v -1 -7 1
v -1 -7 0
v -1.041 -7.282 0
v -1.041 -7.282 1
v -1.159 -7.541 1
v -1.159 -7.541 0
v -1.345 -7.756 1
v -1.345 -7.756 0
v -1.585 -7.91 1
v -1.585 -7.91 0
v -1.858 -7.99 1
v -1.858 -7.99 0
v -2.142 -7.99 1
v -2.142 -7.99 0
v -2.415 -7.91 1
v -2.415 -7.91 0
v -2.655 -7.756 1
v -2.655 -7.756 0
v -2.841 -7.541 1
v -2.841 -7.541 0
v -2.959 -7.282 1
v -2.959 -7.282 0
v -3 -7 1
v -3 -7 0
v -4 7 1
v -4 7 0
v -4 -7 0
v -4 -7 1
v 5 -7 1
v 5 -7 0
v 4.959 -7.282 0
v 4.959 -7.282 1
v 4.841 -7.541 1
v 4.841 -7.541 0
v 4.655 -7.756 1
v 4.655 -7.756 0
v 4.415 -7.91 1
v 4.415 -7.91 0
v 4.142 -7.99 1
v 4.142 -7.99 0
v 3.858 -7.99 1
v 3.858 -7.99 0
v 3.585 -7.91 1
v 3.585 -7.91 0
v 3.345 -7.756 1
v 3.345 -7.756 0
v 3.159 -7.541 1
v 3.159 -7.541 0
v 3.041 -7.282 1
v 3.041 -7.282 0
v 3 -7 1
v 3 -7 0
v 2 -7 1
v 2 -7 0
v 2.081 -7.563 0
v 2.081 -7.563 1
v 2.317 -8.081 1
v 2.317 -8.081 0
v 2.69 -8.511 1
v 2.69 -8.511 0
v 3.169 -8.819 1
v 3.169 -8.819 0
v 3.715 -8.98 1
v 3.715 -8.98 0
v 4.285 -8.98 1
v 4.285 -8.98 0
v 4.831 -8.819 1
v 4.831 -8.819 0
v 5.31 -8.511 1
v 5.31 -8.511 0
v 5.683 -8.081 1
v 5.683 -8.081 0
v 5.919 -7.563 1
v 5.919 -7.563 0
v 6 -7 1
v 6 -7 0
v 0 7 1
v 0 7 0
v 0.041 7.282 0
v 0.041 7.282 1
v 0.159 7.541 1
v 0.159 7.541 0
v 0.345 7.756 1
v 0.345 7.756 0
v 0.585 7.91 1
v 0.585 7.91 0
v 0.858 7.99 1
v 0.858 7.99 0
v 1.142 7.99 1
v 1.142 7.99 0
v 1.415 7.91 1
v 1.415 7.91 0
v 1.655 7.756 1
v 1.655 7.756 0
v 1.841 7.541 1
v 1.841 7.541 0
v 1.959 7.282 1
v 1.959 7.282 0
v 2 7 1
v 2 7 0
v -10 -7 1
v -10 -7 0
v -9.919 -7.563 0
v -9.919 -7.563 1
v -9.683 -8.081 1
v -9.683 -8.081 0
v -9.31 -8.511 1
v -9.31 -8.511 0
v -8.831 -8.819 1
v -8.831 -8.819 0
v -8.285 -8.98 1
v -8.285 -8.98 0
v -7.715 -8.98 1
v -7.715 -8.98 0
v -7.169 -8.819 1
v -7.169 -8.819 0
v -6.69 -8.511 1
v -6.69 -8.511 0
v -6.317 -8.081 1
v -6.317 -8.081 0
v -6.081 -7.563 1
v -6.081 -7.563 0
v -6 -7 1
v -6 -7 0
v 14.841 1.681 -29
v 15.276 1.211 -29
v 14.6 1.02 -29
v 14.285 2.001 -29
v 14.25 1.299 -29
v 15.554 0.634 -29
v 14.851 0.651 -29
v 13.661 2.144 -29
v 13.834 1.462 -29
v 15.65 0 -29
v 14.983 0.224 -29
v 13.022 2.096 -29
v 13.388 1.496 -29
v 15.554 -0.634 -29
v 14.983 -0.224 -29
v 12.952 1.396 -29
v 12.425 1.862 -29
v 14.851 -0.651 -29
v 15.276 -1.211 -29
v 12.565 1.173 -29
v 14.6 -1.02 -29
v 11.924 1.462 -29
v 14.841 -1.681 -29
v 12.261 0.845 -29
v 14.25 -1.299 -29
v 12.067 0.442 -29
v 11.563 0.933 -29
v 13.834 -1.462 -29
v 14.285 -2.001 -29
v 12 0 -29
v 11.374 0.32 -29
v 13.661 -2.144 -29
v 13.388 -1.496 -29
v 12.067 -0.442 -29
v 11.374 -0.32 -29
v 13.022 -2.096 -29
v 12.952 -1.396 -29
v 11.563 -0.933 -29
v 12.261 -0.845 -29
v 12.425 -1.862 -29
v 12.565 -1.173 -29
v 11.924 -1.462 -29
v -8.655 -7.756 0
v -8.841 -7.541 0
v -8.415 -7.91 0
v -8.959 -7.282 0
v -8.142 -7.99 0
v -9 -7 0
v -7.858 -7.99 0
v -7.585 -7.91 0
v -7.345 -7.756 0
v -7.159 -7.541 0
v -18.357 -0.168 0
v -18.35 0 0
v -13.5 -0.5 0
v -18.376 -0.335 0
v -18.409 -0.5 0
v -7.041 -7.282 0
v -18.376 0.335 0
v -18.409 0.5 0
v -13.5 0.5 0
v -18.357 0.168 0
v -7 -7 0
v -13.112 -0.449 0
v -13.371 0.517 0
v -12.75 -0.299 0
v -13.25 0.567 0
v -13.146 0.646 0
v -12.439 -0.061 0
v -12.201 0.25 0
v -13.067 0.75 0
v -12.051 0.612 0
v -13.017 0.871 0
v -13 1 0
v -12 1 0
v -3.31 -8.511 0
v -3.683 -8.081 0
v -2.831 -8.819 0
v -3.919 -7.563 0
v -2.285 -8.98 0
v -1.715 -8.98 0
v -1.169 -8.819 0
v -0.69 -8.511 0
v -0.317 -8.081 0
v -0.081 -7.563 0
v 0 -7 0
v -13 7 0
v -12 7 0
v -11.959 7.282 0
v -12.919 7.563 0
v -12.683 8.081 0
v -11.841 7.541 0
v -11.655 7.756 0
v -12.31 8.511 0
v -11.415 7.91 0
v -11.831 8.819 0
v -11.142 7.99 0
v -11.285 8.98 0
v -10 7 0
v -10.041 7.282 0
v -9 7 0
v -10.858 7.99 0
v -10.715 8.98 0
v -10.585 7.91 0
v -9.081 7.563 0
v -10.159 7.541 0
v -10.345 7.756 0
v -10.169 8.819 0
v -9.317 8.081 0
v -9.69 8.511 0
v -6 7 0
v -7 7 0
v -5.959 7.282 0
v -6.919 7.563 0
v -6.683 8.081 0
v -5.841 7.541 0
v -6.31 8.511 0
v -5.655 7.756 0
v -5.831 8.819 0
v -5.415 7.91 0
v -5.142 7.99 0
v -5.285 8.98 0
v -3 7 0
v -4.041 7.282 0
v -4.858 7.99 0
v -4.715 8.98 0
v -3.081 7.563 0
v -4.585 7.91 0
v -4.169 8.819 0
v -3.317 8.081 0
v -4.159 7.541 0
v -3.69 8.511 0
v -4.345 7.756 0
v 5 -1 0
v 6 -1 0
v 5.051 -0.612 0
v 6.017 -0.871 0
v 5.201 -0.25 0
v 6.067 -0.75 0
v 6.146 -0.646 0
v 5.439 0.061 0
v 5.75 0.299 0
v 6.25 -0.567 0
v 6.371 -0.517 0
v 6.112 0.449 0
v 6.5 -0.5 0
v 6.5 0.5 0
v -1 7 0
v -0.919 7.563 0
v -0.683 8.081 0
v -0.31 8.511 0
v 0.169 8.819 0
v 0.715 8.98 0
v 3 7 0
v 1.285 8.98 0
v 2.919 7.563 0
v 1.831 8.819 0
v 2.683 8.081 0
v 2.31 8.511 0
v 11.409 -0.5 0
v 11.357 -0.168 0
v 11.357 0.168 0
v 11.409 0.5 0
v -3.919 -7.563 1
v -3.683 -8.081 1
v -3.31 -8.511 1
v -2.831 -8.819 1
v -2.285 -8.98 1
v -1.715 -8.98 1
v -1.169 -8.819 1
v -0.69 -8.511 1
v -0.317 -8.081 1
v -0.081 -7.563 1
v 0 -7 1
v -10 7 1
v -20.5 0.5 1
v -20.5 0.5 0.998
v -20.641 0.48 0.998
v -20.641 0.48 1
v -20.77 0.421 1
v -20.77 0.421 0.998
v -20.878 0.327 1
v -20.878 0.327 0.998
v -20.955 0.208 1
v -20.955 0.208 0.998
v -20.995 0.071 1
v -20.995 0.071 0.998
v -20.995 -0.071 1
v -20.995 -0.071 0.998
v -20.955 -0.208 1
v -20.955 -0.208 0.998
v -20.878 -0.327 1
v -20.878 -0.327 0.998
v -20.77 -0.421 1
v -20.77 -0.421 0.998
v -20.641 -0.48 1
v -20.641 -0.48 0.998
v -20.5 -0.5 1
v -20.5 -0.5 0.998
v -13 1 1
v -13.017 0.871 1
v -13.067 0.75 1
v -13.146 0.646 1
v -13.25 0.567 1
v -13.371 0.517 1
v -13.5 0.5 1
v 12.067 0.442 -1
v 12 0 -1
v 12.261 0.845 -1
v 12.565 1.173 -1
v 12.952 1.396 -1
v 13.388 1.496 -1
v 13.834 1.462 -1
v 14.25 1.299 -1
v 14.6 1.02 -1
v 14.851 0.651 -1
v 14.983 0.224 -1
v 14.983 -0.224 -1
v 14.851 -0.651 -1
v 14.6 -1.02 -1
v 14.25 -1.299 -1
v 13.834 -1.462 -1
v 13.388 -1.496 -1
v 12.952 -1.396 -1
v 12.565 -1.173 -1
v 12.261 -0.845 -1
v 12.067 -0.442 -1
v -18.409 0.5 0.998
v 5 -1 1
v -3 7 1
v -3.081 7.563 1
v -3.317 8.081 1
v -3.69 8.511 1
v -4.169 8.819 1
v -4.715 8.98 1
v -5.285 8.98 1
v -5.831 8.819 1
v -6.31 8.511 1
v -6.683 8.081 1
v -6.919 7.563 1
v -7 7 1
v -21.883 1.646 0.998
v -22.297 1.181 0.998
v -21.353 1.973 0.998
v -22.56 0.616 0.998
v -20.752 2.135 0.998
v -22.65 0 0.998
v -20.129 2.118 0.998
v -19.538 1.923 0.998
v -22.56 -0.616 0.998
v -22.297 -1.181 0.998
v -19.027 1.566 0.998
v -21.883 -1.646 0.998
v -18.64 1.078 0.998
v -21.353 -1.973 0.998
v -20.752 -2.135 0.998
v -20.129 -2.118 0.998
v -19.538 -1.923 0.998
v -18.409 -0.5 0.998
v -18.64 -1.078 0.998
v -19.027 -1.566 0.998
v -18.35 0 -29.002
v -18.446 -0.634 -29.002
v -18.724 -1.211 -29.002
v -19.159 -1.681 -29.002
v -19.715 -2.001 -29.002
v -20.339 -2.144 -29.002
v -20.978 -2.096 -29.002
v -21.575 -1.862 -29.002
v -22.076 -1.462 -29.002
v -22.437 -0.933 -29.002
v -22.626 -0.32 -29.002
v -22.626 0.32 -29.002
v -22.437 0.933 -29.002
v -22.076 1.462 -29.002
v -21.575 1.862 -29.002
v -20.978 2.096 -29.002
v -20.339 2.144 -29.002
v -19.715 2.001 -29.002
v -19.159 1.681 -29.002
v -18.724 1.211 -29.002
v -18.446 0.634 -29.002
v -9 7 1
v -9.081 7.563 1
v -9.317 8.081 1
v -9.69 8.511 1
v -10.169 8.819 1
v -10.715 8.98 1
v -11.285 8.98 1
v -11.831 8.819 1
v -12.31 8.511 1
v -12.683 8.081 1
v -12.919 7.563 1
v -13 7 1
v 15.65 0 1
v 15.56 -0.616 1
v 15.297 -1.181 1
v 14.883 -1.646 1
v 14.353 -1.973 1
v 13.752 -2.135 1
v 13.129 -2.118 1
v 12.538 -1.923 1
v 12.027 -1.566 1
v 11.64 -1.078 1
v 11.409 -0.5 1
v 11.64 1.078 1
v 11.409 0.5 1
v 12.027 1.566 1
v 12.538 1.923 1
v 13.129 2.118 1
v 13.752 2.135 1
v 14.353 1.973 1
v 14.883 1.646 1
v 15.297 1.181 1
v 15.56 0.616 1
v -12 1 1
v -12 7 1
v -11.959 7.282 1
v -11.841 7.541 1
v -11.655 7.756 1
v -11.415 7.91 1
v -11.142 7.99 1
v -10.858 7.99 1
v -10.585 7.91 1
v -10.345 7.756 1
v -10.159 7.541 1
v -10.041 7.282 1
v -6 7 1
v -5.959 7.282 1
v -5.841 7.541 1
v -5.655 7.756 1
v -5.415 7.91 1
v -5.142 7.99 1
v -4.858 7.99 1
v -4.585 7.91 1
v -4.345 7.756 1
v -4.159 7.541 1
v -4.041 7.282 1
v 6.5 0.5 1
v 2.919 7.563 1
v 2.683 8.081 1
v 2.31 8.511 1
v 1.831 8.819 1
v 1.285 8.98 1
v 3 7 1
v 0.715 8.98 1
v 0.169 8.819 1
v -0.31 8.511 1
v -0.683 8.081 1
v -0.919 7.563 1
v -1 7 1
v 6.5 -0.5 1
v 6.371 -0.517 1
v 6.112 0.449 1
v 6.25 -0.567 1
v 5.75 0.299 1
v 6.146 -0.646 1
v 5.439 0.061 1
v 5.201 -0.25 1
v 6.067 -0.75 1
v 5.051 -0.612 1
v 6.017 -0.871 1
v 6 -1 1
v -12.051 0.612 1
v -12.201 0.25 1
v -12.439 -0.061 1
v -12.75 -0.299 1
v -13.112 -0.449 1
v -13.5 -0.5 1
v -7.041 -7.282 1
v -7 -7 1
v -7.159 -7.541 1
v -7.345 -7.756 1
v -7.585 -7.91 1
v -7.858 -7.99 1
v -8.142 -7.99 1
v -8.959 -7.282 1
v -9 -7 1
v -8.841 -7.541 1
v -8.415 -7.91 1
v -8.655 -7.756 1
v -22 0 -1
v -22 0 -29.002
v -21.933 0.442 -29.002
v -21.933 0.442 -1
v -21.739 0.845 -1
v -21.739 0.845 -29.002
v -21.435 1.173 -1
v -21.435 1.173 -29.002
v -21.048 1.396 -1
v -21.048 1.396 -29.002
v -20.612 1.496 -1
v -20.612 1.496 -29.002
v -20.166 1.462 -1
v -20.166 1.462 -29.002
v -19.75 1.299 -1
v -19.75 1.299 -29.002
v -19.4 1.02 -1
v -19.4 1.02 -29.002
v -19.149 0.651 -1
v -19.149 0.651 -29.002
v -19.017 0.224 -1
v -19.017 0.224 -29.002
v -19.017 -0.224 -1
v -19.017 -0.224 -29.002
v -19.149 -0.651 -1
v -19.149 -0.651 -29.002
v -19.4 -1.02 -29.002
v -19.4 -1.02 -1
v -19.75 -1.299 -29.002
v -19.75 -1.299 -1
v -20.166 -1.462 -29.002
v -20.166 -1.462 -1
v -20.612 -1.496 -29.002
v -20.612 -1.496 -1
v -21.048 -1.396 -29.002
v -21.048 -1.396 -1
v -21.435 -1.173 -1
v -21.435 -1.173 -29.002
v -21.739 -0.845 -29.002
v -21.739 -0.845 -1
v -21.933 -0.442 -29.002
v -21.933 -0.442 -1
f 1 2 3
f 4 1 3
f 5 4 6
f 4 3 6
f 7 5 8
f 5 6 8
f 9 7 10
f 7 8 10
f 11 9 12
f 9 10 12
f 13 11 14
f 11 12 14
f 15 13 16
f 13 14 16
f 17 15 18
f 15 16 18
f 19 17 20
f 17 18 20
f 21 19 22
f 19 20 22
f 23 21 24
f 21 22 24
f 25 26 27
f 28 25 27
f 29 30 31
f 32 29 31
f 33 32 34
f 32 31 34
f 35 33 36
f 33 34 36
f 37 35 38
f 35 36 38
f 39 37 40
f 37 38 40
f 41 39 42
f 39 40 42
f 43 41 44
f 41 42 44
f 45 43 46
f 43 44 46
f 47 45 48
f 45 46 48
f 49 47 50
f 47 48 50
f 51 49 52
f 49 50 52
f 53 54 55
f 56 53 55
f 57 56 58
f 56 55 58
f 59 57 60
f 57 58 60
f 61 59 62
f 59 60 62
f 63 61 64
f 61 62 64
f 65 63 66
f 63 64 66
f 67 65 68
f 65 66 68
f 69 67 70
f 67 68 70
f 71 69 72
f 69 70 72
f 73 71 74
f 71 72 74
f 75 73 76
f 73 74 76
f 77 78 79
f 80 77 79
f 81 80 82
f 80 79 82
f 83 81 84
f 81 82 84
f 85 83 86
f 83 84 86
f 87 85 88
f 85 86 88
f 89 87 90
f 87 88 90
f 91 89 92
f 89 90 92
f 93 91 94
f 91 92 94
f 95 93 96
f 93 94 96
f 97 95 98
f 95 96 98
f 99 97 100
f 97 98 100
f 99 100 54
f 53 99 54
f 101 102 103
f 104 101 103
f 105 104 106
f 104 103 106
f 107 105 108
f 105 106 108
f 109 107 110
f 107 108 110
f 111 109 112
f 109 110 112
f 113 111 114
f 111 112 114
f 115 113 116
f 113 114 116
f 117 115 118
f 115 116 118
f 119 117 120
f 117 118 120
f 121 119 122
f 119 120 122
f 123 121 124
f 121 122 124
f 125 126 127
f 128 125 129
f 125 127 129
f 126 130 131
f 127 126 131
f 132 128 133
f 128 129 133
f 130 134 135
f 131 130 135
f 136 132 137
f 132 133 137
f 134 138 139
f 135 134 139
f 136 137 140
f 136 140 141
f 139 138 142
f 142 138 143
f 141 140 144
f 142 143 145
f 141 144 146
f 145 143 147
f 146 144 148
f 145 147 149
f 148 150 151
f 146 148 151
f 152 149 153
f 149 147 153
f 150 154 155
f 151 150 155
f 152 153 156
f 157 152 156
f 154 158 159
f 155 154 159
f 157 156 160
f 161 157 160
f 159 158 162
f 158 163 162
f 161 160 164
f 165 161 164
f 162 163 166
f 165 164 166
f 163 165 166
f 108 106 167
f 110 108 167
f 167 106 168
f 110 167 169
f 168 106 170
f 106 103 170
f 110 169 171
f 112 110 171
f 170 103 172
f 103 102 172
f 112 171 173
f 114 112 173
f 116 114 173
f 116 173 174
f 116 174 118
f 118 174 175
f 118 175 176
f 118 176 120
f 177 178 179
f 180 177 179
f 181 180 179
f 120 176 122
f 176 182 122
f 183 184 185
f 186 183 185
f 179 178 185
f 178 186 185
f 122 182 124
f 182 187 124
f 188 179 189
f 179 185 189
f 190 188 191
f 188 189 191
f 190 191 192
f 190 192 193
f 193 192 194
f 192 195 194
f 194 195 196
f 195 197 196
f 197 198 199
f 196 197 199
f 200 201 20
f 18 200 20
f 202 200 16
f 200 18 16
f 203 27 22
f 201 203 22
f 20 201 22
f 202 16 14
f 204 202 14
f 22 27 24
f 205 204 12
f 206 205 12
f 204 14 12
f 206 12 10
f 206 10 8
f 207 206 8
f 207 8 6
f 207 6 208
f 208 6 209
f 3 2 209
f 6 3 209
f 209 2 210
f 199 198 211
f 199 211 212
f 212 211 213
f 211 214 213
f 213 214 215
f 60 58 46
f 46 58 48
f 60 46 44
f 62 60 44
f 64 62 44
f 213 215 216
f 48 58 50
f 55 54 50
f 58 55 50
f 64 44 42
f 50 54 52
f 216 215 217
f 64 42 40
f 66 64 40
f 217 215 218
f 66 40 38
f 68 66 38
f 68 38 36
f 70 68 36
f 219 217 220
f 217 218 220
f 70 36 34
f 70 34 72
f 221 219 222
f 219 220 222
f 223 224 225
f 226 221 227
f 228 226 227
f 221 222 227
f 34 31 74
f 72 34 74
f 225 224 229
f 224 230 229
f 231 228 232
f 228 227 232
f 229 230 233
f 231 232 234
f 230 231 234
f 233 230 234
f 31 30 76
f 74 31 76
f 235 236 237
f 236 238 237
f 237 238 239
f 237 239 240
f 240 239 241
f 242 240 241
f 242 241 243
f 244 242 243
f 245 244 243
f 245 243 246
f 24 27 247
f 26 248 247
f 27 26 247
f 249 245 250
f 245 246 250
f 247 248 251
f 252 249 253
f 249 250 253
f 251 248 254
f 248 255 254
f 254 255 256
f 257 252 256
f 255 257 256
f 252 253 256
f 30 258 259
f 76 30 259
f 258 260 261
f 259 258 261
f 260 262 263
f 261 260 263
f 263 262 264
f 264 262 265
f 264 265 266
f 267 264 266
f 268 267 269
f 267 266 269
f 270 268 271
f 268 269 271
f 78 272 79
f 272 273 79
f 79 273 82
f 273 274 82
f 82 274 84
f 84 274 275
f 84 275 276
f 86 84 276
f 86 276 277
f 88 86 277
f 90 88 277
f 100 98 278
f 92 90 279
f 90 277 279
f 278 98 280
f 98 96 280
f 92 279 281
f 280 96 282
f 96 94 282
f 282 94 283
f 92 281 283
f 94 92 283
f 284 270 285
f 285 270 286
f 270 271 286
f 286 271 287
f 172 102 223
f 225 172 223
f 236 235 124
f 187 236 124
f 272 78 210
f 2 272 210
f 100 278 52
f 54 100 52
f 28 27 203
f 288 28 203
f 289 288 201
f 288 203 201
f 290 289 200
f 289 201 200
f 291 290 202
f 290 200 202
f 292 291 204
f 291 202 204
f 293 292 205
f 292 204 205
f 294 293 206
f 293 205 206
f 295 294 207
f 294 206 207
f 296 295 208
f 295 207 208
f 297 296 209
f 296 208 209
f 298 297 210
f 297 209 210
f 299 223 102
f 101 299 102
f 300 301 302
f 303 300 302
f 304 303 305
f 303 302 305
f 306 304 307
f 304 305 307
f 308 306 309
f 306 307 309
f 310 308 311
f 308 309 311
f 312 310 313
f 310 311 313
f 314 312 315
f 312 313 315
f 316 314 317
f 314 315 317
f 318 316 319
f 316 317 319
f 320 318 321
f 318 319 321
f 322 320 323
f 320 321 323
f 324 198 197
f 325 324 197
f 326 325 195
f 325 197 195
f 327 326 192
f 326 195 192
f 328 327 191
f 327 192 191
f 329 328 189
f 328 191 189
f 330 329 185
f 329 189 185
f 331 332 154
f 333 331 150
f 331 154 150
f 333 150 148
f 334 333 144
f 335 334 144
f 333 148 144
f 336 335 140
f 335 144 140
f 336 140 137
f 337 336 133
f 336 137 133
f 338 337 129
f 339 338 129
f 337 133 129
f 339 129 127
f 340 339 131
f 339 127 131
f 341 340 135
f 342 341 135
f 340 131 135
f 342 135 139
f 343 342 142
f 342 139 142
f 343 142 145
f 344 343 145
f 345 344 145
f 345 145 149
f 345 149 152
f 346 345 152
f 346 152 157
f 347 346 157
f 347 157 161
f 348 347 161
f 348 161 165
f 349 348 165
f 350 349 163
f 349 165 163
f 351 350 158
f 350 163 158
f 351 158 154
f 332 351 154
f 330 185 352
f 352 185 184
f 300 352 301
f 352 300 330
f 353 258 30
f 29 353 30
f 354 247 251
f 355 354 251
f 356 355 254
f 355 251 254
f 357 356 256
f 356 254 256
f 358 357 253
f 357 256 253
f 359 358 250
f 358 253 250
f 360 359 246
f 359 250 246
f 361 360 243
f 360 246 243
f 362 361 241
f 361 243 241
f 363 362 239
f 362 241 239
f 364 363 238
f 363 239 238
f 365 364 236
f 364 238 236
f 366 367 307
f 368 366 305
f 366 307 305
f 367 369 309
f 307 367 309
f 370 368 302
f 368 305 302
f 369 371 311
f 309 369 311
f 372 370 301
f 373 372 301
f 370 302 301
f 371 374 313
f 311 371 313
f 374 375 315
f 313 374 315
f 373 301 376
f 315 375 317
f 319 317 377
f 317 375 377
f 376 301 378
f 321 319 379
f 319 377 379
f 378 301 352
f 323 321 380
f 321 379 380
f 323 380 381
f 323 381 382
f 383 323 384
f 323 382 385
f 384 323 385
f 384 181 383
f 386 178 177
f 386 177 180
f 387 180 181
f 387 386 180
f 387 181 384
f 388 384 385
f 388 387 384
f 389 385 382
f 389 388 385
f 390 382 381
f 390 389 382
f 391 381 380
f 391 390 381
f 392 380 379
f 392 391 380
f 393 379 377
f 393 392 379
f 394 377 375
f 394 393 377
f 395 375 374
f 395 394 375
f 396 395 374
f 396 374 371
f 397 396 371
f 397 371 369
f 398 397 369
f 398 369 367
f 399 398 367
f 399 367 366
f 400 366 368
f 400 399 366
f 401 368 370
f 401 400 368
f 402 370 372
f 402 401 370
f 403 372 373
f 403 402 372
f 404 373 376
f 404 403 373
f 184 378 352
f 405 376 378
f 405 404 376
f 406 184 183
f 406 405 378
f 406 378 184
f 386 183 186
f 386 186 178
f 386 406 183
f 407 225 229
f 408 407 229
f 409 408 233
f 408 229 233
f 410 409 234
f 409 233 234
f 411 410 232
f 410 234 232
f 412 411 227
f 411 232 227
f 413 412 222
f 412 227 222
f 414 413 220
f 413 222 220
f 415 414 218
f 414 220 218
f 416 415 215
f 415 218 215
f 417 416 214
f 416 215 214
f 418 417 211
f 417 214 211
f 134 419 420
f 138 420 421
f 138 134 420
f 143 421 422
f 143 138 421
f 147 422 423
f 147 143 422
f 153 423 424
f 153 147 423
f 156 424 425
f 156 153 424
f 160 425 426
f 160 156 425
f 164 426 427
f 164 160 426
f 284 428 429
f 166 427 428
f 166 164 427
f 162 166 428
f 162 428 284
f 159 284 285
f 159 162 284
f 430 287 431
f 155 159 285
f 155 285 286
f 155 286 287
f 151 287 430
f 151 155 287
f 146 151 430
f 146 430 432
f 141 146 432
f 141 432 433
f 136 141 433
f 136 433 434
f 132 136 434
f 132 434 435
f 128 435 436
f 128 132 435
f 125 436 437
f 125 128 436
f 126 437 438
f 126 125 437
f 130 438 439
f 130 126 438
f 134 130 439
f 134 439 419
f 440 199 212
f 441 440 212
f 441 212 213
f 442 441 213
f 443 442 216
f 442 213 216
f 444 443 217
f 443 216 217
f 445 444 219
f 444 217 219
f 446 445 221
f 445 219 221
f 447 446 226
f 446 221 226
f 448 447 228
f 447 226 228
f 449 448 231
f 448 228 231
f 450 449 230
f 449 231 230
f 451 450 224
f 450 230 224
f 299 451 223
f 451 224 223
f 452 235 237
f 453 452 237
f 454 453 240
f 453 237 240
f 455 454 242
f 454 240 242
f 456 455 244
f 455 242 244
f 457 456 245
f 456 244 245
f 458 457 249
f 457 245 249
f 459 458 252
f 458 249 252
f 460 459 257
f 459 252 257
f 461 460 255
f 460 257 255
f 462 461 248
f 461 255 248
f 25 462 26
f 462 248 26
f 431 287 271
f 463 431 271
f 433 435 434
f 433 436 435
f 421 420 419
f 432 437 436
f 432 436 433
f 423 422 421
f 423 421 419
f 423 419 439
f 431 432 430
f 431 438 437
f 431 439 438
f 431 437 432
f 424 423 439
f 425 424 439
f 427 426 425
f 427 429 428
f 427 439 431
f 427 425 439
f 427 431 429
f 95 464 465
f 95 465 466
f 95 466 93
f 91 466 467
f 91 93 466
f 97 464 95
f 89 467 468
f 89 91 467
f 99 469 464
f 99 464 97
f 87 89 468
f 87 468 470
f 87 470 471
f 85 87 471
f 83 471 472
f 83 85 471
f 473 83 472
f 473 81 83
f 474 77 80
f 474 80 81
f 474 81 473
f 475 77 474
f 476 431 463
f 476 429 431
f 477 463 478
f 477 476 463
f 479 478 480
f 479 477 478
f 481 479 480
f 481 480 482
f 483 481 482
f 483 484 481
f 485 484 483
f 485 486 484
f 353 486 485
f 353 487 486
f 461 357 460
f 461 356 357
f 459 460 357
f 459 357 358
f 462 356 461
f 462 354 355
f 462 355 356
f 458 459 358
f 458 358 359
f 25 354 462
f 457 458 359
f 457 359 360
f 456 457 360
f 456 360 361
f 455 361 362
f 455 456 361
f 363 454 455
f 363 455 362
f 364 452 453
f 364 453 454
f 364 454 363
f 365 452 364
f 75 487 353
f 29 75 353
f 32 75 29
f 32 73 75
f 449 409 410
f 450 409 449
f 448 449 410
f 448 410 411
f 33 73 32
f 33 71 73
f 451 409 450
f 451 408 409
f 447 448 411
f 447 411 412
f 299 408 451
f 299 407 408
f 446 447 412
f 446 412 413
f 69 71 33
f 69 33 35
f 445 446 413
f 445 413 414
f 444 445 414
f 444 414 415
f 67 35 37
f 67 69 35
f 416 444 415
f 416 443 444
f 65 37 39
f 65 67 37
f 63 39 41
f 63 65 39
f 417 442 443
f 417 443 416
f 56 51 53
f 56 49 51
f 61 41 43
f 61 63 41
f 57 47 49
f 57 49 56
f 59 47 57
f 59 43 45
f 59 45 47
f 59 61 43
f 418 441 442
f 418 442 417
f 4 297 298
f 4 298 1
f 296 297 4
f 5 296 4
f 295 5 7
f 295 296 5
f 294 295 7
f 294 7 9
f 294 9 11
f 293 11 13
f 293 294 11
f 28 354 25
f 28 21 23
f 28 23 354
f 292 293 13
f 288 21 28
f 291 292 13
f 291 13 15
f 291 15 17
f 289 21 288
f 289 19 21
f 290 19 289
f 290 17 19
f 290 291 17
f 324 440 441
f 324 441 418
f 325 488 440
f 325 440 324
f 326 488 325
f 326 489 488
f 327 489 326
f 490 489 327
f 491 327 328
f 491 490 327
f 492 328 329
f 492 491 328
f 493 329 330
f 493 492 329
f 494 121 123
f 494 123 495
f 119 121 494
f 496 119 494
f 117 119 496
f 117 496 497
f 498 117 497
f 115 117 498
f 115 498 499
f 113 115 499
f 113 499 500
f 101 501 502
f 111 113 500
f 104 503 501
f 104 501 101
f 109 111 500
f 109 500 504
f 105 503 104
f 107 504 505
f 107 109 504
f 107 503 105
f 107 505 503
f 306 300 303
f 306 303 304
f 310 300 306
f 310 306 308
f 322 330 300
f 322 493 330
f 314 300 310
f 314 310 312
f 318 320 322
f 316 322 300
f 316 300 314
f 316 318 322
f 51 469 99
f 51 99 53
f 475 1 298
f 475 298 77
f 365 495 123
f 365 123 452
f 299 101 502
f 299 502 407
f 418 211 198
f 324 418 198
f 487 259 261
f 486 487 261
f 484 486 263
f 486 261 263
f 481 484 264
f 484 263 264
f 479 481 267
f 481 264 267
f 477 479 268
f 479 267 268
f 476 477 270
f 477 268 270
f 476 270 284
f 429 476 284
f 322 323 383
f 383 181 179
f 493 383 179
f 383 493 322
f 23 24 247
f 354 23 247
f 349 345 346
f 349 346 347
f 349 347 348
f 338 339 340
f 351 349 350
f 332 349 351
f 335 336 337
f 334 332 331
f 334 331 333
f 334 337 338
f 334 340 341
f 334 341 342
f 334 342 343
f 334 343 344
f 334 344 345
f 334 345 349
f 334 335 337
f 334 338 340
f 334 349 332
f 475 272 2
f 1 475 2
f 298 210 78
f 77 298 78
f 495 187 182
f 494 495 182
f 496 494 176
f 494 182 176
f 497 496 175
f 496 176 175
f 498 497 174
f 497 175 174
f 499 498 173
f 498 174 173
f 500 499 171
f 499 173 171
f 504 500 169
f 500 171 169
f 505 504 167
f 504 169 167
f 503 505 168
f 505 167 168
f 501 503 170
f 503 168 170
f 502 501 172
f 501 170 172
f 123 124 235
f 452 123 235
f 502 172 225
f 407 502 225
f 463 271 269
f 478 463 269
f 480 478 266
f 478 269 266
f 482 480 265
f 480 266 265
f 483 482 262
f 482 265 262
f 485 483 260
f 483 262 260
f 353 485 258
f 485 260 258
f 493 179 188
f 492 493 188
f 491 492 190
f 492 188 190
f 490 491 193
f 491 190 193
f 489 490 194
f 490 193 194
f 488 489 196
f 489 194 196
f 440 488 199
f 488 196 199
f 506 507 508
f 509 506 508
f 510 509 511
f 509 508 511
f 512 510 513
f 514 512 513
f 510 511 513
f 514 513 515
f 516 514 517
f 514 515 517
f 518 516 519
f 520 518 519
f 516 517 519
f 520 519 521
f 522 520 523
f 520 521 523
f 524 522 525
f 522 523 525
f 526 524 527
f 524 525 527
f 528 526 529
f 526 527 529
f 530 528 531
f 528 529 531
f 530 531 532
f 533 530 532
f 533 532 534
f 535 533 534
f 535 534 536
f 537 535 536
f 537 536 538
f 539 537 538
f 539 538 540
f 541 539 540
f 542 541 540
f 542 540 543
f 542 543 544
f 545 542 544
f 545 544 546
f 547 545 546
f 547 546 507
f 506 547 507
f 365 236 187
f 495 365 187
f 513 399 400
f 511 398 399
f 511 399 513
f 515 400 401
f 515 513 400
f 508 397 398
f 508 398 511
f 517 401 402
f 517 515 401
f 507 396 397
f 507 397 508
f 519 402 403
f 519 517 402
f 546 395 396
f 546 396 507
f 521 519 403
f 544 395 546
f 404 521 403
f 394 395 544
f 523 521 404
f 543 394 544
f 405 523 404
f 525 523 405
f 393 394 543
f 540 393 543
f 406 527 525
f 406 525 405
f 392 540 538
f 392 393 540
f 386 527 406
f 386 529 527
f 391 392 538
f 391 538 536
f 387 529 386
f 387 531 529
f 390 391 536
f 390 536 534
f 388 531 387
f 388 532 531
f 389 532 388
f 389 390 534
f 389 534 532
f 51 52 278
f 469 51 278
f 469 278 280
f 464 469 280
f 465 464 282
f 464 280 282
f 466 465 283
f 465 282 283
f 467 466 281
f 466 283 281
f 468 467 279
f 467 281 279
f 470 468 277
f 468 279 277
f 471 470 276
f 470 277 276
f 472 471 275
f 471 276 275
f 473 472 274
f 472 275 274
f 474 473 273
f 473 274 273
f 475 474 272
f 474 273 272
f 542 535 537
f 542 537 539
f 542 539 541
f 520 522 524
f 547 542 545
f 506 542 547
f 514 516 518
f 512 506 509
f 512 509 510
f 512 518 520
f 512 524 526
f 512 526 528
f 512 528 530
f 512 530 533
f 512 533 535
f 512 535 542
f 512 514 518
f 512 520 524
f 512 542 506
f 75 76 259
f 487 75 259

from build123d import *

# Parameters (mm, degrees)
BOSS_EXTRUDE1_DEPTH = 1
SKETCH3_W           = 2.15
SKETCH3_H           = 30
SKETCH4_W           = 2.15
SKETCH4_H           = 30
SKETCH5_R           = 1.5
CUT_EXTRUDE1_DEPTH  = 28
SKETCH6_R           = 1.5
CUT_EXTRUDE2_DEPTH  = 28


with BuildPart() as part:
    # Sketch2 → Boss-Extrude1 (new body)
    with BuildSketch(Plane.XY):
        with BuildLine():
            Line((-20.5, -0.5), (-13.5, -0.5))
            ThreePointArc((-13.5, -0.5), (-12.439339828, -0.060660172), (-12, 1))
            Line((-12, 1), (-12, 7))
            ThreePointArc((-12, 7), (-11, 8), (-10, 7))
            Line((-10, 7), (-10, 0))
            Line((-10, 0), (-10, -7))
            ThreePointArc((-10, -7), (-8, -9), (-6, -7))
            Line((-6, -7), (-6, 0))
            Line((-6, 0), (-6, 7))
            ThreePointArc((-6, 7), (-5, 8), (-4, 7))
            Line((-4, 7), (-4, 0))
            Line((-4, 0), (-4, -7))
            ThreePointArc((-4, -7), (-2, -9), (0, -7))
            Line((0, -7), (0, 0))
            Line((0, 0), (0, 7))
            ThreePointArc((0, 7), (1, 8), (2, 7))
            Line((2, 7), (2, 0))
            Line((2, 0), (2, -7))
            ThreePointArc((2, -7), (4, -9), (6, -7))
            Line((6, -7), (6, -1))
            ThreePointArc((6, -1), (6.146446609, -0.646446609), (6.5, -0.5))
            Line((6.5, -0.5), (13.5, -0.5))
            ThreePointArc((13.5, -0.5), (14, 0), (13.5, 0.5))
            Line((13.5, 0.5), (6.5, 0.5))
            ThreePointArc((6.5, 0.5), (5.439339828, 0.060660172), (5, -1))
            Line((5, -1), (5, -7))
            ThreePointArc((5, -7), (4, -8), (3, -7))
            Line((3, -7), (3, 0))
            Line((3, 0), (3, 7))
            ThreePointArc((3, 7), (1, 9), (-1, 7))
            Line((-1, 7), (-1, 0))
            Line((-1, 0), (-1, -7))
            ThreePointArc((-1, -7), (-2, -8), (-3, -7))
            Line((-3, -7), (-3, 0))
            Line((-3, 0), (-3, 7))
            ThreePointArc((-3, 7), (-5, 9), (-7, 7))
            Line((-7, 7), (-7, 0))
            Line((-7, 0), (-7, -7))
            ThreePointArc((-7, -7), (-8, -8), (-9, -7))
            Line((-9, -7), (-9, 0))
            Line((-9, 0), (-9, 7))
            ThreePointArc((-9, 7), (-11, 9), (-13, 7))
            Line((-13, 7), (-13, 1))
            ThreePointArc((-13, 1), (-13.146446609, 0.646446609), (-13.5, 0.5))
            Line((-13.5, 0.5), (-20.5, 0.5))
            ThreePointArc((-20.5, 0.5), (-21, 0), (-20.5, -0.5))
        make_face()
    extrude(amount=BOSS_EXTRUDE1_DEPTH)

    # Sketch3 → Revolve1 (revolve)
    with BuildSketch(Plane(origin=(0, 0, 0), x_dir=(1, 0, 0), z_dir=(0, 1, 0)), mode=Mode.PRIVATE) as revolve1_sk:
        with Locations((-21.575, 14.001632273)):
            Rectangle(SKETCH3_W, SKETCH3_H)
    revolve(revolve1_sk.sketch.rotate(Axis((-20.5, 0, 0.998367727), (0, 0, -1)), 180), axis=Axis((-20.5, 0, 0.998367727), (0, 0, -1)))

    # Sketch4 → Revolve2 (revolve)
    with BuildSketch(Plane(origin=(0, 0, 0), x_dir=(1, 0, 0), z_dir=(0, 1, 0))):
        with Locations((14.575, 14)):
            Rectangle(SKETCH4_W, SKETCH4_H)
    revolve(axis=Axis((13.5, 0, 1), (0, 0, -1)))

    # Sketch5 → Cut-Extrude1 (cut)
    with BuildSketch(Plane(origin=(0, 0, -29), x_dir=(-1, 0, 0), z_dir=(0, 0, -1))):
        with Locations((-13.5, 0)):
            Circle(SKETCH5_R)
        with Locations((20.5, 0)):
            Circle(SKETCH5_R)
    extrude(amount=-CUT_EXTRUDE1_DEPTH, mode=Mode.SUBTRACT)

    # Sketch6 → Cut-Extrude2 (cut)
    with BuildSketch(Plane(origin=(0, 0, -29.001632273), x_dir=(-1, 0, 0), z_dir=(0, 0, -1))):
        with Locations((20.5, 0)):
            Circle(SKETCH6_R)
    extrude(amount=-CUT_EXTRUDE2_DEPTH, mode=Mode.SUBTRACT)


solid = part.part
